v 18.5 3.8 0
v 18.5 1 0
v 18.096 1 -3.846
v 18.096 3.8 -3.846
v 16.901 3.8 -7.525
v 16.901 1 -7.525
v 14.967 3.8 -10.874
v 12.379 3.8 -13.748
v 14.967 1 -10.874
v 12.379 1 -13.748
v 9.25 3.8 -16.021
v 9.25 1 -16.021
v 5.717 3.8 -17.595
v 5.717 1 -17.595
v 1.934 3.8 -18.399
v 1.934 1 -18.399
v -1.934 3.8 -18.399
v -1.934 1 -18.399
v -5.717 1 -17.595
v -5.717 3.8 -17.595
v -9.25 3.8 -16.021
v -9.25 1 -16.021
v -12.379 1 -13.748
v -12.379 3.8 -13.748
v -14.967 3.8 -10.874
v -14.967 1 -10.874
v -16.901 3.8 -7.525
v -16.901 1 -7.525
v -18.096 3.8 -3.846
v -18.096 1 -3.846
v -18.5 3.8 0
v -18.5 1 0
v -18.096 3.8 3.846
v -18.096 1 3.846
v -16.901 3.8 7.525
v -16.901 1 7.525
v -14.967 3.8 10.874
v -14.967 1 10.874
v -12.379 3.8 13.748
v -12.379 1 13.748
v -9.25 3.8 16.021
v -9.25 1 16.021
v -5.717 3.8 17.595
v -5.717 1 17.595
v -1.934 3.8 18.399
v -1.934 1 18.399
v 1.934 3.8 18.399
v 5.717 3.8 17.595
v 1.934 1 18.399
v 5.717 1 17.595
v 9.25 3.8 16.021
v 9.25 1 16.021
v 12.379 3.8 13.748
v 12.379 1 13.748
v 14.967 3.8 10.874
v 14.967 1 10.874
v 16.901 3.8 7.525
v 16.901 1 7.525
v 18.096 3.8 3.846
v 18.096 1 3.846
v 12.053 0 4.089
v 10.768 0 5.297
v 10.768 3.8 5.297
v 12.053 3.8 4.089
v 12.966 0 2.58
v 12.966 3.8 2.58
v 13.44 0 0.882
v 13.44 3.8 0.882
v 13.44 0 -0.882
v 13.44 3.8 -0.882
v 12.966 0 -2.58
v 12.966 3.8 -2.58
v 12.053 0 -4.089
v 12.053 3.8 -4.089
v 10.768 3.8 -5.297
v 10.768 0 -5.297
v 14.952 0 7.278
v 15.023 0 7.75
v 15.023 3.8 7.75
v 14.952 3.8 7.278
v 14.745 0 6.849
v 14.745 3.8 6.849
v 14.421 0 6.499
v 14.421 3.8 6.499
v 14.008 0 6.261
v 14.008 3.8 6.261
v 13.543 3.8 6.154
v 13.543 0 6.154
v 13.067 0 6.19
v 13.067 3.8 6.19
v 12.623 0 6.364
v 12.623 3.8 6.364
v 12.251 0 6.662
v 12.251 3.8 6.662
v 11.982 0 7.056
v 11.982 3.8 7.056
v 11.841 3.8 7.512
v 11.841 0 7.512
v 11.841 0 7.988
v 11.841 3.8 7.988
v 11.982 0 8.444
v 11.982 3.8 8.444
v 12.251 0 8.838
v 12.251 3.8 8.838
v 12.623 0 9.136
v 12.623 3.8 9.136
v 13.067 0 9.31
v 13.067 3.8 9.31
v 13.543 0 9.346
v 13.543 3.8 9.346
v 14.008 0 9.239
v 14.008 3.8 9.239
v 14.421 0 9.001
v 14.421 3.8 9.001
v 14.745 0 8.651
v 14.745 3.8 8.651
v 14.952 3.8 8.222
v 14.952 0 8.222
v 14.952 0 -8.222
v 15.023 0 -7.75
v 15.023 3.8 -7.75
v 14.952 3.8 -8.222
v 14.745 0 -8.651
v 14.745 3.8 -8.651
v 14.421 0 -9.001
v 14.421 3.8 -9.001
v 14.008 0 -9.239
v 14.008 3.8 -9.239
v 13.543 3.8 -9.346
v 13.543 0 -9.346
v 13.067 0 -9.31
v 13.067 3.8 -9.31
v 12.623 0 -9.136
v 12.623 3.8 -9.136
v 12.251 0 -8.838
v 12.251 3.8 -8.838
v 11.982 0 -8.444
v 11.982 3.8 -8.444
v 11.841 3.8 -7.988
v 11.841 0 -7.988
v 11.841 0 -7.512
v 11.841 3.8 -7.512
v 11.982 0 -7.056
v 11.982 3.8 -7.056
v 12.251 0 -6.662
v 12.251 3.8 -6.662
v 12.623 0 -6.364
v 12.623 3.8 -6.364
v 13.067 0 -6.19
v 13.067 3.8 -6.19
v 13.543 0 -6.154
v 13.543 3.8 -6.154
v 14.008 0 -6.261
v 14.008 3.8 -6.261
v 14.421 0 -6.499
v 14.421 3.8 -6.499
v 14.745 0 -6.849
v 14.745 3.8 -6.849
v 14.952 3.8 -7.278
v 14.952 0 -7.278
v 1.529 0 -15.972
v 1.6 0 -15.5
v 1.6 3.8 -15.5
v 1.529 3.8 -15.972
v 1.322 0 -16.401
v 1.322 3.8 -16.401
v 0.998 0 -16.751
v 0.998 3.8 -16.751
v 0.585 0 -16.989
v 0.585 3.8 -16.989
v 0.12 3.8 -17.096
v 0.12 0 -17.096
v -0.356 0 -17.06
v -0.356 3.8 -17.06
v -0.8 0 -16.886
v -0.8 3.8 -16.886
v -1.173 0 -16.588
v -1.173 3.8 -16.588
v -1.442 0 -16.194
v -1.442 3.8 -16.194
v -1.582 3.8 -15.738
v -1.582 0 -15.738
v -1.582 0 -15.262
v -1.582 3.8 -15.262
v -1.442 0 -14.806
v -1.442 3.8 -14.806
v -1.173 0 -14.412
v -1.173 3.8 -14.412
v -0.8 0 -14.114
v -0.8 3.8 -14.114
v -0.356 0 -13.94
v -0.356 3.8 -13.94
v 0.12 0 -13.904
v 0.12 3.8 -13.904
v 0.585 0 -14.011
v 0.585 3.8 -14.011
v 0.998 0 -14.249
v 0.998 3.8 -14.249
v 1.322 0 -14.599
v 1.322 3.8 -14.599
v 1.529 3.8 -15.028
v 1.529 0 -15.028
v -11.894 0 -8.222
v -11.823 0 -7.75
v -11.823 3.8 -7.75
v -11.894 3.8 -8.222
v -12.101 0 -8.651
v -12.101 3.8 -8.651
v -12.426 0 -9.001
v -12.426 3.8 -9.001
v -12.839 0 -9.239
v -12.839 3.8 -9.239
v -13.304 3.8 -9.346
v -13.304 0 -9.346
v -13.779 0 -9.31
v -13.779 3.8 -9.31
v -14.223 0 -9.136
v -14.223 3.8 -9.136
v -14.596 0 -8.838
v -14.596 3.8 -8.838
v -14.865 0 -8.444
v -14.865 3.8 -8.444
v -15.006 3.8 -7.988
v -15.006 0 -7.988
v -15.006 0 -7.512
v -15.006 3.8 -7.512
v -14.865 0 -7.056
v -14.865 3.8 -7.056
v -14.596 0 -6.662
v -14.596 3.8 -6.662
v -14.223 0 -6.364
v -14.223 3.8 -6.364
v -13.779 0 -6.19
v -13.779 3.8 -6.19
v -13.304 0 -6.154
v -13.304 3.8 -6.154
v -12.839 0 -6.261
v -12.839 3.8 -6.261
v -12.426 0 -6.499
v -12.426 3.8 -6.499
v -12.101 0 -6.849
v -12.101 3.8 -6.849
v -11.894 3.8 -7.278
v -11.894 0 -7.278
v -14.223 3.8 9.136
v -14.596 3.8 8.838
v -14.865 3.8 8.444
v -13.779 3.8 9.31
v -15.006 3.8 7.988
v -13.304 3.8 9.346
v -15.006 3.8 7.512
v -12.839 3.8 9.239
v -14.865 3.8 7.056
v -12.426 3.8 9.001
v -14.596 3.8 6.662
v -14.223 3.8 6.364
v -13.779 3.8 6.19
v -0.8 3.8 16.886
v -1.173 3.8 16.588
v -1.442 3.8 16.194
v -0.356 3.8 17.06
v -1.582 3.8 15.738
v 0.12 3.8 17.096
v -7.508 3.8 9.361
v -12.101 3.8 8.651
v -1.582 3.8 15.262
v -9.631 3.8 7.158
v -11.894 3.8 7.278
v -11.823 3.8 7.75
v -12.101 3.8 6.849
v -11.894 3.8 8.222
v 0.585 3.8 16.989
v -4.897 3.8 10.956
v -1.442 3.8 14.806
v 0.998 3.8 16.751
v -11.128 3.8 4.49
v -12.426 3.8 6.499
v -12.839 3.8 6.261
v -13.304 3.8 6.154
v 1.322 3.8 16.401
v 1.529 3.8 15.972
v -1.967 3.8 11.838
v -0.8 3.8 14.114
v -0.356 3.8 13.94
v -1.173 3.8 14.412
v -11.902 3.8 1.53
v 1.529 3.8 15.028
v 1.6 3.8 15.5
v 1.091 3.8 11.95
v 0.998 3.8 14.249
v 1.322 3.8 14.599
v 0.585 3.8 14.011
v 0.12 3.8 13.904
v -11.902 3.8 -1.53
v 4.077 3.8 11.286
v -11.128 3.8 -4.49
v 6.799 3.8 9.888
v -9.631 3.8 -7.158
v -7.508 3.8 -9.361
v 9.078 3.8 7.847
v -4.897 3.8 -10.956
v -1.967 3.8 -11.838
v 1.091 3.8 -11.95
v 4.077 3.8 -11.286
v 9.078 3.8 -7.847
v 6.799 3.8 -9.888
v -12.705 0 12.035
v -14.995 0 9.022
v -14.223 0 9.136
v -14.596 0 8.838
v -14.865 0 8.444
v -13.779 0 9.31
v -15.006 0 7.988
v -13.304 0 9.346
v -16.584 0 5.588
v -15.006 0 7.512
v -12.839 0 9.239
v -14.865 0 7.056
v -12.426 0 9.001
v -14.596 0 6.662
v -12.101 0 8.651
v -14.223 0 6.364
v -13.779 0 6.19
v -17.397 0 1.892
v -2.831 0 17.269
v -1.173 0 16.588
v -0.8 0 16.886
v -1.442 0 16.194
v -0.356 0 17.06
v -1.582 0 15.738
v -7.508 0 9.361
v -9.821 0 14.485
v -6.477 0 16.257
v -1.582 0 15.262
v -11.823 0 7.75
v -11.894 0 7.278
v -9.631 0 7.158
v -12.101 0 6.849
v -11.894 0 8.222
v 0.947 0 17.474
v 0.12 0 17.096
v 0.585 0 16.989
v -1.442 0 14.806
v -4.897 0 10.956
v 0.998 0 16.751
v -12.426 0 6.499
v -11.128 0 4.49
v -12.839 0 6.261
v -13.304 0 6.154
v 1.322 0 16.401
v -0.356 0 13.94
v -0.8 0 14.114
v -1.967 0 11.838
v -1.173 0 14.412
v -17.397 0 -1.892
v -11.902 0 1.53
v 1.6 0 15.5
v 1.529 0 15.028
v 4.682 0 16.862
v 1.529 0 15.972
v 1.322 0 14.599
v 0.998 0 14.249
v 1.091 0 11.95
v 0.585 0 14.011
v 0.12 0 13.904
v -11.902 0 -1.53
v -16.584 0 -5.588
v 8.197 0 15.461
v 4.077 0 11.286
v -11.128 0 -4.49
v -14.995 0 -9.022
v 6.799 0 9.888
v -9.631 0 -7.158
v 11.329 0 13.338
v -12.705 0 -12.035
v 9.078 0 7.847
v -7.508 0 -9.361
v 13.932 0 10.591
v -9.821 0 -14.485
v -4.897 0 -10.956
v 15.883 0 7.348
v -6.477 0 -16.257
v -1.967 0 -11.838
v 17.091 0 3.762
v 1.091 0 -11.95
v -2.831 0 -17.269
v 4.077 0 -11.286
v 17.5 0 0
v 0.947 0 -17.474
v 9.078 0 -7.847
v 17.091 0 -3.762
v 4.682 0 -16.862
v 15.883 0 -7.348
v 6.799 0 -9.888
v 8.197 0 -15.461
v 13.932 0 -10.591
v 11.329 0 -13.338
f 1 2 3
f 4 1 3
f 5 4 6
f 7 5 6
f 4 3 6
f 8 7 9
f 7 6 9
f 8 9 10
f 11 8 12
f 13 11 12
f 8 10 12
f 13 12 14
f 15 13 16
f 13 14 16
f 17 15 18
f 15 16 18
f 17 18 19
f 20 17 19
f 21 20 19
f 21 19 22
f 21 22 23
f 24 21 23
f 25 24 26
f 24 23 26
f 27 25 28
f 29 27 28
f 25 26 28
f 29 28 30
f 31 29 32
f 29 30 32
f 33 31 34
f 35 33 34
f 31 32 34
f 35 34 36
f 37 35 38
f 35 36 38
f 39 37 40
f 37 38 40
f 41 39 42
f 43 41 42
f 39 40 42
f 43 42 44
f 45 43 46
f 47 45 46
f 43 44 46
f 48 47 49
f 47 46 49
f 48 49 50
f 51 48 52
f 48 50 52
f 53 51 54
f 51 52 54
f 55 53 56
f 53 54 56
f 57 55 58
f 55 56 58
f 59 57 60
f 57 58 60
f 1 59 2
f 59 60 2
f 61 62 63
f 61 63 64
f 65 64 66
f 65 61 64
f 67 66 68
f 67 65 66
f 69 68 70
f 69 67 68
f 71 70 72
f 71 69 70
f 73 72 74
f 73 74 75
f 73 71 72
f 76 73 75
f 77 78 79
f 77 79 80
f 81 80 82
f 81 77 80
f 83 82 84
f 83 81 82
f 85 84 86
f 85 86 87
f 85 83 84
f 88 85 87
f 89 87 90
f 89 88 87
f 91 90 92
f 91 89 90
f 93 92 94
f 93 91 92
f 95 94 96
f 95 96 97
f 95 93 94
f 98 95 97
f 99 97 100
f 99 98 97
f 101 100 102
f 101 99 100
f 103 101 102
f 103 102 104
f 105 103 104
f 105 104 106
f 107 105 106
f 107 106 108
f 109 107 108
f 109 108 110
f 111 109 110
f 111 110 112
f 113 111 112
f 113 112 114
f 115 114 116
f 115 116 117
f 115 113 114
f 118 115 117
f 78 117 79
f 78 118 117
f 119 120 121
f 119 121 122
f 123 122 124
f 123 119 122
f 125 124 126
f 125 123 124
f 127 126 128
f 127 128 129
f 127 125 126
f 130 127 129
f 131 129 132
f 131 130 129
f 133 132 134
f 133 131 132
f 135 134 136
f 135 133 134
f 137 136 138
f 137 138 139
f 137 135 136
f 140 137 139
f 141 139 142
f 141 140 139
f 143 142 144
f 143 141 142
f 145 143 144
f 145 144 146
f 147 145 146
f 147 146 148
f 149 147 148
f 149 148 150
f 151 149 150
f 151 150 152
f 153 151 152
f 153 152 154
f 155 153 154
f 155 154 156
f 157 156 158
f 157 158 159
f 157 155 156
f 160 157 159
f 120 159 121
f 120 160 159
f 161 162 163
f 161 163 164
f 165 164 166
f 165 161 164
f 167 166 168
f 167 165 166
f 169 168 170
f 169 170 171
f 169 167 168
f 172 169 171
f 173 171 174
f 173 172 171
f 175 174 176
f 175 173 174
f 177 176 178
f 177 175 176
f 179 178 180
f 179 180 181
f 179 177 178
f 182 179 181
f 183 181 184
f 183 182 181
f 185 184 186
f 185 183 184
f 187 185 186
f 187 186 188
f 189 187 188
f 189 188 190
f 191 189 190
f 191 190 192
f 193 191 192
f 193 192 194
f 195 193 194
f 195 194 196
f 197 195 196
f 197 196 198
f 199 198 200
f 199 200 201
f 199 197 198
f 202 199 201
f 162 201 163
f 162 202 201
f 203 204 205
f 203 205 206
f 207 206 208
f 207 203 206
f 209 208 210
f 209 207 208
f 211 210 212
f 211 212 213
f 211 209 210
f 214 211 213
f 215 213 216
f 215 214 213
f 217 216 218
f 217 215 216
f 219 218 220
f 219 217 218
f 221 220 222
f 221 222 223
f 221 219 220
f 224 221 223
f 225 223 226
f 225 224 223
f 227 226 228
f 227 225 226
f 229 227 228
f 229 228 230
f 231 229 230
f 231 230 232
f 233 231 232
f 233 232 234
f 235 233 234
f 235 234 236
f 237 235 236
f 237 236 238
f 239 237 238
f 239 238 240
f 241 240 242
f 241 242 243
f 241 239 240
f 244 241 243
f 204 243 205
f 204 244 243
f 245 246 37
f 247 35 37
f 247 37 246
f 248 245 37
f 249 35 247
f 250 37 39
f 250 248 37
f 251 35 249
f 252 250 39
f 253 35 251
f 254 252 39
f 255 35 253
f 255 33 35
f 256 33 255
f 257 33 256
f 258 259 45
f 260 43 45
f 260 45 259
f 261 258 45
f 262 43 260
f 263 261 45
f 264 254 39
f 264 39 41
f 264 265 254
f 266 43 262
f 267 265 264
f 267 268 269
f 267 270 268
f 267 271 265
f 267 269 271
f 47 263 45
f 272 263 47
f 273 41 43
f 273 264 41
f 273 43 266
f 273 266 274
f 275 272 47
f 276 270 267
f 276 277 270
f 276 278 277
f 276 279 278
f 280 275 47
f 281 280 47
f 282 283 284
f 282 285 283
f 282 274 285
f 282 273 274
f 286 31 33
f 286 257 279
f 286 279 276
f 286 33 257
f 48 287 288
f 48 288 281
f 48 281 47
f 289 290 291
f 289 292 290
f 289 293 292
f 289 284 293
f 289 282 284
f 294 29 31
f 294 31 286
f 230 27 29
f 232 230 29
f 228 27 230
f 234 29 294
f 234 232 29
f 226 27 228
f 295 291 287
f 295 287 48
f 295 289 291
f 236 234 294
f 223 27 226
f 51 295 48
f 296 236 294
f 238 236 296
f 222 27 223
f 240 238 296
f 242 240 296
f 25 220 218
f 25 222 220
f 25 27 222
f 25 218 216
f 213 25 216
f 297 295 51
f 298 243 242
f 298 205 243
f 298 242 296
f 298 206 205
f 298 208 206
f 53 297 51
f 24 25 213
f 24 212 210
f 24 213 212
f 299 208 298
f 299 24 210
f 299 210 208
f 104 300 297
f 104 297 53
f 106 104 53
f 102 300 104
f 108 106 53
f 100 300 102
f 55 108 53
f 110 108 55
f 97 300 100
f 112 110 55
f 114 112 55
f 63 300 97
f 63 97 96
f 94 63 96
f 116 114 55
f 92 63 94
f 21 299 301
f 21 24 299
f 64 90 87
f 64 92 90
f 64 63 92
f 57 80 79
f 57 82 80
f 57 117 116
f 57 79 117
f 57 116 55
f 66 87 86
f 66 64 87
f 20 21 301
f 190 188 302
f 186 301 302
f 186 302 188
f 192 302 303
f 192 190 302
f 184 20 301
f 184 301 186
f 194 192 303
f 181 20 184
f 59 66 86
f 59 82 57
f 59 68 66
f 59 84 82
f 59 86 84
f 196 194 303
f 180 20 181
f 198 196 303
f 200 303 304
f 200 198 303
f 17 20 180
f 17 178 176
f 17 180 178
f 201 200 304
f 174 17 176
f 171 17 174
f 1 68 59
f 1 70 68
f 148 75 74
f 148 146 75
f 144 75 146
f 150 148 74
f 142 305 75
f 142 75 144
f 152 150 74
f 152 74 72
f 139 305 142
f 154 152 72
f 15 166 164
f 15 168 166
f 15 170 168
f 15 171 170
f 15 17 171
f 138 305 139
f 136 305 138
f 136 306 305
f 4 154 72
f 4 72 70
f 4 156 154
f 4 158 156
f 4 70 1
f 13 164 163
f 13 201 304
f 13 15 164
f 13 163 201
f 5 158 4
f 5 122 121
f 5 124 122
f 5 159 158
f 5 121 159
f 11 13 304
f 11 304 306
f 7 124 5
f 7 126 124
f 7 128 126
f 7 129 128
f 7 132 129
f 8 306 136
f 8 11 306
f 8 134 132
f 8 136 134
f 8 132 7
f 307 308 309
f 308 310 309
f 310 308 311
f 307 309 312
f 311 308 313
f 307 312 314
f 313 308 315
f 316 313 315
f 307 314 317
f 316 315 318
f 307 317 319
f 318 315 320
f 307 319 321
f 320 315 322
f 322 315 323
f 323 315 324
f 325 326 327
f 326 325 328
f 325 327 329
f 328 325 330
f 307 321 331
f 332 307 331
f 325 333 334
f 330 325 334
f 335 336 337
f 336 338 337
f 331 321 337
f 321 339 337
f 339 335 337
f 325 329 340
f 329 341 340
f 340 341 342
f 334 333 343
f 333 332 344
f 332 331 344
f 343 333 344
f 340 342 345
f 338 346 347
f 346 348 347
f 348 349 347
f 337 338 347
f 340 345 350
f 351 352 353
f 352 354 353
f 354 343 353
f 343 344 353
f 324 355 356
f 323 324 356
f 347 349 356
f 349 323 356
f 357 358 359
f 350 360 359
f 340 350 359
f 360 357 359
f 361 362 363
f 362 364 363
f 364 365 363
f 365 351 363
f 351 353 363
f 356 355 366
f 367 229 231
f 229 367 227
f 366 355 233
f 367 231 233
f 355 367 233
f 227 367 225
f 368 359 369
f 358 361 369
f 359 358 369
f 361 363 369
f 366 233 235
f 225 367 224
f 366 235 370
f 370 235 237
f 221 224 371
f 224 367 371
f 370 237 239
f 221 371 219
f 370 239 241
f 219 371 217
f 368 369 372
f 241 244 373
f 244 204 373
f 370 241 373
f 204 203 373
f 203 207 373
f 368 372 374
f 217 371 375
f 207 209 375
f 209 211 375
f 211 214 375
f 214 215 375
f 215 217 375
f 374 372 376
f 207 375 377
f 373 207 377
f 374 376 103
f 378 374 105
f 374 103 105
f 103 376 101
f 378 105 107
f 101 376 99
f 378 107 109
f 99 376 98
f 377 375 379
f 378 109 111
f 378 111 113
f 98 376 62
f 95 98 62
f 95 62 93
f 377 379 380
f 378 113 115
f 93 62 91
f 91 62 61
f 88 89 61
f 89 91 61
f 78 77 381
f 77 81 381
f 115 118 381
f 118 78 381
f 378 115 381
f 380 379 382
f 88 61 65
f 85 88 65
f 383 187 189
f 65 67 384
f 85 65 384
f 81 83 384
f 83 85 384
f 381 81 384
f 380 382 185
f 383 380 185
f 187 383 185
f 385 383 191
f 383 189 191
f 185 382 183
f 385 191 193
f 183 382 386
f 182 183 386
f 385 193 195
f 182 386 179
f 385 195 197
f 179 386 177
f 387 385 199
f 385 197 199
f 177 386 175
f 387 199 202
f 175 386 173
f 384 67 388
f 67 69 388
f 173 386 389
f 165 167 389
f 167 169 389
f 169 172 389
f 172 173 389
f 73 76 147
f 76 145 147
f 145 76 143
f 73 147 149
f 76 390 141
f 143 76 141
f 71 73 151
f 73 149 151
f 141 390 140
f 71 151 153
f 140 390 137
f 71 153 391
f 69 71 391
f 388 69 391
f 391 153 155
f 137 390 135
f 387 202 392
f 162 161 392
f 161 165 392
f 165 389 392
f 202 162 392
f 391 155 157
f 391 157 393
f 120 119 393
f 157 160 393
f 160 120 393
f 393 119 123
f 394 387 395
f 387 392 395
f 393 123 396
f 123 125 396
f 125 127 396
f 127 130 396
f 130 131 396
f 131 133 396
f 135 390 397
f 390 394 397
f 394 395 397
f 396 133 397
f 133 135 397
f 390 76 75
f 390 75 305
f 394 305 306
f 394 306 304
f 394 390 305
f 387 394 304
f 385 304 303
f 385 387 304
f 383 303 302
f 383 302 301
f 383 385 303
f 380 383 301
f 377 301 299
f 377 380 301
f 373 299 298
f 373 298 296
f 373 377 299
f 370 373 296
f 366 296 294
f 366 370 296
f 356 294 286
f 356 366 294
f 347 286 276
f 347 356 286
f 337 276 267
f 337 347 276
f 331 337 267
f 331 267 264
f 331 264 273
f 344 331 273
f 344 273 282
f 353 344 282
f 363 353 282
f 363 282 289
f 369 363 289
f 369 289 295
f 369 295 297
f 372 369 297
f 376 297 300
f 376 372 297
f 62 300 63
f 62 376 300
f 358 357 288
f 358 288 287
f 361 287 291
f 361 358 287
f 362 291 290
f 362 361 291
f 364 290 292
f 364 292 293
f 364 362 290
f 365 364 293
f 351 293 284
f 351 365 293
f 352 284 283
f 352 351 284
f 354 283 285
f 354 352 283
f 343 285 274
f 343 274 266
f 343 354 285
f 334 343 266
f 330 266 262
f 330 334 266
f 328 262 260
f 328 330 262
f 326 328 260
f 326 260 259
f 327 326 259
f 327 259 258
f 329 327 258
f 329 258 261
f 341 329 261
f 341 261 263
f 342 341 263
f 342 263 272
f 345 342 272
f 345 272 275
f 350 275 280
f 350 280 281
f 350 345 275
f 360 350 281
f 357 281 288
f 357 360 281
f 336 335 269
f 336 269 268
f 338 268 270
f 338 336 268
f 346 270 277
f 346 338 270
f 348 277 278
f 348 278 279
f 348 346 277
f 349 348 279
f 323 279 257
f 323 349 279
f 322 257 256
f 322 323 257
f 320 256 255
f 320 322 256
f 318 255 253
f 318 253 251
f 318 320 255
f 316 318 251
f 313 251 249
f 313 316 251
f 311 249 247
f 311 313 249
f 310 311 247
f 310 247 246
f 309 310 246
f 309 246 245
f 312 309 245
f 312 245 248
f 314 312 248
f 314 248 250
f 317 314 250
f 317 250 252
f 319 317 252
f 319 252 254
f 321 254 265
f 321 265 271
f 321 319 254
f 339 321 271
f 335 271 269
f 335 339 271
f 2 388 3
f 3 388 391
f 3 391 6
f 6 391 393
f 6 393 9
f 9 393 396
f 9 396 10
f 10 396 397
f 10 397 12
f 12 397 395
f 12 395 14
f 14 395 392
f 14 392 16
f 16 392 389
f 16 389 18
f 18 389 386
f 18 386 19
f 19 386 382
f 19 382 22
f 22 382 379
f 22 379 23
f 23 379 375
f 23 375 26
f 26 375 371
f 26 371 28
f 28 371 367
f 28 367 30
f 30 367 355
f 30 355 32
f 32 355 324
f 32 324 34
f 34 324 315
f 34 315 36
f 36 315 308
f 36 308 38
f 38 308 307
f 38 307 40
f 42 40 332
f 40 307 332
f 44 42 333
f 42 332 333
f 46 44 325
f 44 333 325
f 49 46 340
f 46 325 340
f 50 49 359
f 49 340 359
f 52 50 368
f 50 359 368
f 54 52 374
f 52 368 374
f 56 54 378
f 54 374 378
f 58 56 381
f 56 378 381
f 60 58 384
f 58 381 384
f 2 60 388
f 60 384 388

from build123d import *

# Parameters (mm, degrees)
SKETCH_1_R      = 18.5
SKETCH_1_R_2    = 1.6
EXTRUDE_1_DEPTH = 3.8
CHAMFER_1_SIZE  = 1


with BuildPart() as part:
    # Эскиз1 → Бобышка-Вытянуть1 (new body)
    with BuildSketch(Plane(origin=(0, 0, 0), x_dir=(1, 0, 0), z_dir=(0, 1, 0))):
        Circle(SKETCH_1_R)
        with Locations((-13.423393759, -7.75)):
            Circle(SKETCH_1_R_2, mode=Mode.SUBTRACT)
        with Locations((0, -15.5)):
            Circle(SKETCH_1_R_2, mode=Mode.SUBTRACT)
        with Locations((-13.423393759, 7.75)):
            Circle(SKETCH_1_R_2, mode=Mode.SUBTRACT)
        with Locations((0, 15.5)):
            Circle(SKETCH_1_R_2, mode=Mode.SUBTRACT)
        with Locations((13.423393759, 7.75)):
            Circle(SKETCH_1_R_2, mode=Mode.SUBTRACT)
        with Locations((13.423393759, -7.75)):
            Circle(SKETCH_1_R_2, mode=Mode.SUBTRACT)
        with BuildLine():
            ThreePointArc((10.767857143, -5.296532125), (13.5, 0), (10.767857143, 5.296532125))
            ThreePointArc((10.767857143, 5.296532125), (-12, 0), (10.767857143, -5.296532125))
        make_face(mode=Mode.SUBTRACT)
    extrude(amount=EXTRUDE_1_DEPTH)

    # Фаска1
    chamfer_1_edges = [part.edges().sort_by_distance(p)[0] for p in [
        (-18.5, 0, 0),
    ]]
    chamfer(chamfer_1_edges, length=CHAMFER_1_SIZE)


solid = part.part
